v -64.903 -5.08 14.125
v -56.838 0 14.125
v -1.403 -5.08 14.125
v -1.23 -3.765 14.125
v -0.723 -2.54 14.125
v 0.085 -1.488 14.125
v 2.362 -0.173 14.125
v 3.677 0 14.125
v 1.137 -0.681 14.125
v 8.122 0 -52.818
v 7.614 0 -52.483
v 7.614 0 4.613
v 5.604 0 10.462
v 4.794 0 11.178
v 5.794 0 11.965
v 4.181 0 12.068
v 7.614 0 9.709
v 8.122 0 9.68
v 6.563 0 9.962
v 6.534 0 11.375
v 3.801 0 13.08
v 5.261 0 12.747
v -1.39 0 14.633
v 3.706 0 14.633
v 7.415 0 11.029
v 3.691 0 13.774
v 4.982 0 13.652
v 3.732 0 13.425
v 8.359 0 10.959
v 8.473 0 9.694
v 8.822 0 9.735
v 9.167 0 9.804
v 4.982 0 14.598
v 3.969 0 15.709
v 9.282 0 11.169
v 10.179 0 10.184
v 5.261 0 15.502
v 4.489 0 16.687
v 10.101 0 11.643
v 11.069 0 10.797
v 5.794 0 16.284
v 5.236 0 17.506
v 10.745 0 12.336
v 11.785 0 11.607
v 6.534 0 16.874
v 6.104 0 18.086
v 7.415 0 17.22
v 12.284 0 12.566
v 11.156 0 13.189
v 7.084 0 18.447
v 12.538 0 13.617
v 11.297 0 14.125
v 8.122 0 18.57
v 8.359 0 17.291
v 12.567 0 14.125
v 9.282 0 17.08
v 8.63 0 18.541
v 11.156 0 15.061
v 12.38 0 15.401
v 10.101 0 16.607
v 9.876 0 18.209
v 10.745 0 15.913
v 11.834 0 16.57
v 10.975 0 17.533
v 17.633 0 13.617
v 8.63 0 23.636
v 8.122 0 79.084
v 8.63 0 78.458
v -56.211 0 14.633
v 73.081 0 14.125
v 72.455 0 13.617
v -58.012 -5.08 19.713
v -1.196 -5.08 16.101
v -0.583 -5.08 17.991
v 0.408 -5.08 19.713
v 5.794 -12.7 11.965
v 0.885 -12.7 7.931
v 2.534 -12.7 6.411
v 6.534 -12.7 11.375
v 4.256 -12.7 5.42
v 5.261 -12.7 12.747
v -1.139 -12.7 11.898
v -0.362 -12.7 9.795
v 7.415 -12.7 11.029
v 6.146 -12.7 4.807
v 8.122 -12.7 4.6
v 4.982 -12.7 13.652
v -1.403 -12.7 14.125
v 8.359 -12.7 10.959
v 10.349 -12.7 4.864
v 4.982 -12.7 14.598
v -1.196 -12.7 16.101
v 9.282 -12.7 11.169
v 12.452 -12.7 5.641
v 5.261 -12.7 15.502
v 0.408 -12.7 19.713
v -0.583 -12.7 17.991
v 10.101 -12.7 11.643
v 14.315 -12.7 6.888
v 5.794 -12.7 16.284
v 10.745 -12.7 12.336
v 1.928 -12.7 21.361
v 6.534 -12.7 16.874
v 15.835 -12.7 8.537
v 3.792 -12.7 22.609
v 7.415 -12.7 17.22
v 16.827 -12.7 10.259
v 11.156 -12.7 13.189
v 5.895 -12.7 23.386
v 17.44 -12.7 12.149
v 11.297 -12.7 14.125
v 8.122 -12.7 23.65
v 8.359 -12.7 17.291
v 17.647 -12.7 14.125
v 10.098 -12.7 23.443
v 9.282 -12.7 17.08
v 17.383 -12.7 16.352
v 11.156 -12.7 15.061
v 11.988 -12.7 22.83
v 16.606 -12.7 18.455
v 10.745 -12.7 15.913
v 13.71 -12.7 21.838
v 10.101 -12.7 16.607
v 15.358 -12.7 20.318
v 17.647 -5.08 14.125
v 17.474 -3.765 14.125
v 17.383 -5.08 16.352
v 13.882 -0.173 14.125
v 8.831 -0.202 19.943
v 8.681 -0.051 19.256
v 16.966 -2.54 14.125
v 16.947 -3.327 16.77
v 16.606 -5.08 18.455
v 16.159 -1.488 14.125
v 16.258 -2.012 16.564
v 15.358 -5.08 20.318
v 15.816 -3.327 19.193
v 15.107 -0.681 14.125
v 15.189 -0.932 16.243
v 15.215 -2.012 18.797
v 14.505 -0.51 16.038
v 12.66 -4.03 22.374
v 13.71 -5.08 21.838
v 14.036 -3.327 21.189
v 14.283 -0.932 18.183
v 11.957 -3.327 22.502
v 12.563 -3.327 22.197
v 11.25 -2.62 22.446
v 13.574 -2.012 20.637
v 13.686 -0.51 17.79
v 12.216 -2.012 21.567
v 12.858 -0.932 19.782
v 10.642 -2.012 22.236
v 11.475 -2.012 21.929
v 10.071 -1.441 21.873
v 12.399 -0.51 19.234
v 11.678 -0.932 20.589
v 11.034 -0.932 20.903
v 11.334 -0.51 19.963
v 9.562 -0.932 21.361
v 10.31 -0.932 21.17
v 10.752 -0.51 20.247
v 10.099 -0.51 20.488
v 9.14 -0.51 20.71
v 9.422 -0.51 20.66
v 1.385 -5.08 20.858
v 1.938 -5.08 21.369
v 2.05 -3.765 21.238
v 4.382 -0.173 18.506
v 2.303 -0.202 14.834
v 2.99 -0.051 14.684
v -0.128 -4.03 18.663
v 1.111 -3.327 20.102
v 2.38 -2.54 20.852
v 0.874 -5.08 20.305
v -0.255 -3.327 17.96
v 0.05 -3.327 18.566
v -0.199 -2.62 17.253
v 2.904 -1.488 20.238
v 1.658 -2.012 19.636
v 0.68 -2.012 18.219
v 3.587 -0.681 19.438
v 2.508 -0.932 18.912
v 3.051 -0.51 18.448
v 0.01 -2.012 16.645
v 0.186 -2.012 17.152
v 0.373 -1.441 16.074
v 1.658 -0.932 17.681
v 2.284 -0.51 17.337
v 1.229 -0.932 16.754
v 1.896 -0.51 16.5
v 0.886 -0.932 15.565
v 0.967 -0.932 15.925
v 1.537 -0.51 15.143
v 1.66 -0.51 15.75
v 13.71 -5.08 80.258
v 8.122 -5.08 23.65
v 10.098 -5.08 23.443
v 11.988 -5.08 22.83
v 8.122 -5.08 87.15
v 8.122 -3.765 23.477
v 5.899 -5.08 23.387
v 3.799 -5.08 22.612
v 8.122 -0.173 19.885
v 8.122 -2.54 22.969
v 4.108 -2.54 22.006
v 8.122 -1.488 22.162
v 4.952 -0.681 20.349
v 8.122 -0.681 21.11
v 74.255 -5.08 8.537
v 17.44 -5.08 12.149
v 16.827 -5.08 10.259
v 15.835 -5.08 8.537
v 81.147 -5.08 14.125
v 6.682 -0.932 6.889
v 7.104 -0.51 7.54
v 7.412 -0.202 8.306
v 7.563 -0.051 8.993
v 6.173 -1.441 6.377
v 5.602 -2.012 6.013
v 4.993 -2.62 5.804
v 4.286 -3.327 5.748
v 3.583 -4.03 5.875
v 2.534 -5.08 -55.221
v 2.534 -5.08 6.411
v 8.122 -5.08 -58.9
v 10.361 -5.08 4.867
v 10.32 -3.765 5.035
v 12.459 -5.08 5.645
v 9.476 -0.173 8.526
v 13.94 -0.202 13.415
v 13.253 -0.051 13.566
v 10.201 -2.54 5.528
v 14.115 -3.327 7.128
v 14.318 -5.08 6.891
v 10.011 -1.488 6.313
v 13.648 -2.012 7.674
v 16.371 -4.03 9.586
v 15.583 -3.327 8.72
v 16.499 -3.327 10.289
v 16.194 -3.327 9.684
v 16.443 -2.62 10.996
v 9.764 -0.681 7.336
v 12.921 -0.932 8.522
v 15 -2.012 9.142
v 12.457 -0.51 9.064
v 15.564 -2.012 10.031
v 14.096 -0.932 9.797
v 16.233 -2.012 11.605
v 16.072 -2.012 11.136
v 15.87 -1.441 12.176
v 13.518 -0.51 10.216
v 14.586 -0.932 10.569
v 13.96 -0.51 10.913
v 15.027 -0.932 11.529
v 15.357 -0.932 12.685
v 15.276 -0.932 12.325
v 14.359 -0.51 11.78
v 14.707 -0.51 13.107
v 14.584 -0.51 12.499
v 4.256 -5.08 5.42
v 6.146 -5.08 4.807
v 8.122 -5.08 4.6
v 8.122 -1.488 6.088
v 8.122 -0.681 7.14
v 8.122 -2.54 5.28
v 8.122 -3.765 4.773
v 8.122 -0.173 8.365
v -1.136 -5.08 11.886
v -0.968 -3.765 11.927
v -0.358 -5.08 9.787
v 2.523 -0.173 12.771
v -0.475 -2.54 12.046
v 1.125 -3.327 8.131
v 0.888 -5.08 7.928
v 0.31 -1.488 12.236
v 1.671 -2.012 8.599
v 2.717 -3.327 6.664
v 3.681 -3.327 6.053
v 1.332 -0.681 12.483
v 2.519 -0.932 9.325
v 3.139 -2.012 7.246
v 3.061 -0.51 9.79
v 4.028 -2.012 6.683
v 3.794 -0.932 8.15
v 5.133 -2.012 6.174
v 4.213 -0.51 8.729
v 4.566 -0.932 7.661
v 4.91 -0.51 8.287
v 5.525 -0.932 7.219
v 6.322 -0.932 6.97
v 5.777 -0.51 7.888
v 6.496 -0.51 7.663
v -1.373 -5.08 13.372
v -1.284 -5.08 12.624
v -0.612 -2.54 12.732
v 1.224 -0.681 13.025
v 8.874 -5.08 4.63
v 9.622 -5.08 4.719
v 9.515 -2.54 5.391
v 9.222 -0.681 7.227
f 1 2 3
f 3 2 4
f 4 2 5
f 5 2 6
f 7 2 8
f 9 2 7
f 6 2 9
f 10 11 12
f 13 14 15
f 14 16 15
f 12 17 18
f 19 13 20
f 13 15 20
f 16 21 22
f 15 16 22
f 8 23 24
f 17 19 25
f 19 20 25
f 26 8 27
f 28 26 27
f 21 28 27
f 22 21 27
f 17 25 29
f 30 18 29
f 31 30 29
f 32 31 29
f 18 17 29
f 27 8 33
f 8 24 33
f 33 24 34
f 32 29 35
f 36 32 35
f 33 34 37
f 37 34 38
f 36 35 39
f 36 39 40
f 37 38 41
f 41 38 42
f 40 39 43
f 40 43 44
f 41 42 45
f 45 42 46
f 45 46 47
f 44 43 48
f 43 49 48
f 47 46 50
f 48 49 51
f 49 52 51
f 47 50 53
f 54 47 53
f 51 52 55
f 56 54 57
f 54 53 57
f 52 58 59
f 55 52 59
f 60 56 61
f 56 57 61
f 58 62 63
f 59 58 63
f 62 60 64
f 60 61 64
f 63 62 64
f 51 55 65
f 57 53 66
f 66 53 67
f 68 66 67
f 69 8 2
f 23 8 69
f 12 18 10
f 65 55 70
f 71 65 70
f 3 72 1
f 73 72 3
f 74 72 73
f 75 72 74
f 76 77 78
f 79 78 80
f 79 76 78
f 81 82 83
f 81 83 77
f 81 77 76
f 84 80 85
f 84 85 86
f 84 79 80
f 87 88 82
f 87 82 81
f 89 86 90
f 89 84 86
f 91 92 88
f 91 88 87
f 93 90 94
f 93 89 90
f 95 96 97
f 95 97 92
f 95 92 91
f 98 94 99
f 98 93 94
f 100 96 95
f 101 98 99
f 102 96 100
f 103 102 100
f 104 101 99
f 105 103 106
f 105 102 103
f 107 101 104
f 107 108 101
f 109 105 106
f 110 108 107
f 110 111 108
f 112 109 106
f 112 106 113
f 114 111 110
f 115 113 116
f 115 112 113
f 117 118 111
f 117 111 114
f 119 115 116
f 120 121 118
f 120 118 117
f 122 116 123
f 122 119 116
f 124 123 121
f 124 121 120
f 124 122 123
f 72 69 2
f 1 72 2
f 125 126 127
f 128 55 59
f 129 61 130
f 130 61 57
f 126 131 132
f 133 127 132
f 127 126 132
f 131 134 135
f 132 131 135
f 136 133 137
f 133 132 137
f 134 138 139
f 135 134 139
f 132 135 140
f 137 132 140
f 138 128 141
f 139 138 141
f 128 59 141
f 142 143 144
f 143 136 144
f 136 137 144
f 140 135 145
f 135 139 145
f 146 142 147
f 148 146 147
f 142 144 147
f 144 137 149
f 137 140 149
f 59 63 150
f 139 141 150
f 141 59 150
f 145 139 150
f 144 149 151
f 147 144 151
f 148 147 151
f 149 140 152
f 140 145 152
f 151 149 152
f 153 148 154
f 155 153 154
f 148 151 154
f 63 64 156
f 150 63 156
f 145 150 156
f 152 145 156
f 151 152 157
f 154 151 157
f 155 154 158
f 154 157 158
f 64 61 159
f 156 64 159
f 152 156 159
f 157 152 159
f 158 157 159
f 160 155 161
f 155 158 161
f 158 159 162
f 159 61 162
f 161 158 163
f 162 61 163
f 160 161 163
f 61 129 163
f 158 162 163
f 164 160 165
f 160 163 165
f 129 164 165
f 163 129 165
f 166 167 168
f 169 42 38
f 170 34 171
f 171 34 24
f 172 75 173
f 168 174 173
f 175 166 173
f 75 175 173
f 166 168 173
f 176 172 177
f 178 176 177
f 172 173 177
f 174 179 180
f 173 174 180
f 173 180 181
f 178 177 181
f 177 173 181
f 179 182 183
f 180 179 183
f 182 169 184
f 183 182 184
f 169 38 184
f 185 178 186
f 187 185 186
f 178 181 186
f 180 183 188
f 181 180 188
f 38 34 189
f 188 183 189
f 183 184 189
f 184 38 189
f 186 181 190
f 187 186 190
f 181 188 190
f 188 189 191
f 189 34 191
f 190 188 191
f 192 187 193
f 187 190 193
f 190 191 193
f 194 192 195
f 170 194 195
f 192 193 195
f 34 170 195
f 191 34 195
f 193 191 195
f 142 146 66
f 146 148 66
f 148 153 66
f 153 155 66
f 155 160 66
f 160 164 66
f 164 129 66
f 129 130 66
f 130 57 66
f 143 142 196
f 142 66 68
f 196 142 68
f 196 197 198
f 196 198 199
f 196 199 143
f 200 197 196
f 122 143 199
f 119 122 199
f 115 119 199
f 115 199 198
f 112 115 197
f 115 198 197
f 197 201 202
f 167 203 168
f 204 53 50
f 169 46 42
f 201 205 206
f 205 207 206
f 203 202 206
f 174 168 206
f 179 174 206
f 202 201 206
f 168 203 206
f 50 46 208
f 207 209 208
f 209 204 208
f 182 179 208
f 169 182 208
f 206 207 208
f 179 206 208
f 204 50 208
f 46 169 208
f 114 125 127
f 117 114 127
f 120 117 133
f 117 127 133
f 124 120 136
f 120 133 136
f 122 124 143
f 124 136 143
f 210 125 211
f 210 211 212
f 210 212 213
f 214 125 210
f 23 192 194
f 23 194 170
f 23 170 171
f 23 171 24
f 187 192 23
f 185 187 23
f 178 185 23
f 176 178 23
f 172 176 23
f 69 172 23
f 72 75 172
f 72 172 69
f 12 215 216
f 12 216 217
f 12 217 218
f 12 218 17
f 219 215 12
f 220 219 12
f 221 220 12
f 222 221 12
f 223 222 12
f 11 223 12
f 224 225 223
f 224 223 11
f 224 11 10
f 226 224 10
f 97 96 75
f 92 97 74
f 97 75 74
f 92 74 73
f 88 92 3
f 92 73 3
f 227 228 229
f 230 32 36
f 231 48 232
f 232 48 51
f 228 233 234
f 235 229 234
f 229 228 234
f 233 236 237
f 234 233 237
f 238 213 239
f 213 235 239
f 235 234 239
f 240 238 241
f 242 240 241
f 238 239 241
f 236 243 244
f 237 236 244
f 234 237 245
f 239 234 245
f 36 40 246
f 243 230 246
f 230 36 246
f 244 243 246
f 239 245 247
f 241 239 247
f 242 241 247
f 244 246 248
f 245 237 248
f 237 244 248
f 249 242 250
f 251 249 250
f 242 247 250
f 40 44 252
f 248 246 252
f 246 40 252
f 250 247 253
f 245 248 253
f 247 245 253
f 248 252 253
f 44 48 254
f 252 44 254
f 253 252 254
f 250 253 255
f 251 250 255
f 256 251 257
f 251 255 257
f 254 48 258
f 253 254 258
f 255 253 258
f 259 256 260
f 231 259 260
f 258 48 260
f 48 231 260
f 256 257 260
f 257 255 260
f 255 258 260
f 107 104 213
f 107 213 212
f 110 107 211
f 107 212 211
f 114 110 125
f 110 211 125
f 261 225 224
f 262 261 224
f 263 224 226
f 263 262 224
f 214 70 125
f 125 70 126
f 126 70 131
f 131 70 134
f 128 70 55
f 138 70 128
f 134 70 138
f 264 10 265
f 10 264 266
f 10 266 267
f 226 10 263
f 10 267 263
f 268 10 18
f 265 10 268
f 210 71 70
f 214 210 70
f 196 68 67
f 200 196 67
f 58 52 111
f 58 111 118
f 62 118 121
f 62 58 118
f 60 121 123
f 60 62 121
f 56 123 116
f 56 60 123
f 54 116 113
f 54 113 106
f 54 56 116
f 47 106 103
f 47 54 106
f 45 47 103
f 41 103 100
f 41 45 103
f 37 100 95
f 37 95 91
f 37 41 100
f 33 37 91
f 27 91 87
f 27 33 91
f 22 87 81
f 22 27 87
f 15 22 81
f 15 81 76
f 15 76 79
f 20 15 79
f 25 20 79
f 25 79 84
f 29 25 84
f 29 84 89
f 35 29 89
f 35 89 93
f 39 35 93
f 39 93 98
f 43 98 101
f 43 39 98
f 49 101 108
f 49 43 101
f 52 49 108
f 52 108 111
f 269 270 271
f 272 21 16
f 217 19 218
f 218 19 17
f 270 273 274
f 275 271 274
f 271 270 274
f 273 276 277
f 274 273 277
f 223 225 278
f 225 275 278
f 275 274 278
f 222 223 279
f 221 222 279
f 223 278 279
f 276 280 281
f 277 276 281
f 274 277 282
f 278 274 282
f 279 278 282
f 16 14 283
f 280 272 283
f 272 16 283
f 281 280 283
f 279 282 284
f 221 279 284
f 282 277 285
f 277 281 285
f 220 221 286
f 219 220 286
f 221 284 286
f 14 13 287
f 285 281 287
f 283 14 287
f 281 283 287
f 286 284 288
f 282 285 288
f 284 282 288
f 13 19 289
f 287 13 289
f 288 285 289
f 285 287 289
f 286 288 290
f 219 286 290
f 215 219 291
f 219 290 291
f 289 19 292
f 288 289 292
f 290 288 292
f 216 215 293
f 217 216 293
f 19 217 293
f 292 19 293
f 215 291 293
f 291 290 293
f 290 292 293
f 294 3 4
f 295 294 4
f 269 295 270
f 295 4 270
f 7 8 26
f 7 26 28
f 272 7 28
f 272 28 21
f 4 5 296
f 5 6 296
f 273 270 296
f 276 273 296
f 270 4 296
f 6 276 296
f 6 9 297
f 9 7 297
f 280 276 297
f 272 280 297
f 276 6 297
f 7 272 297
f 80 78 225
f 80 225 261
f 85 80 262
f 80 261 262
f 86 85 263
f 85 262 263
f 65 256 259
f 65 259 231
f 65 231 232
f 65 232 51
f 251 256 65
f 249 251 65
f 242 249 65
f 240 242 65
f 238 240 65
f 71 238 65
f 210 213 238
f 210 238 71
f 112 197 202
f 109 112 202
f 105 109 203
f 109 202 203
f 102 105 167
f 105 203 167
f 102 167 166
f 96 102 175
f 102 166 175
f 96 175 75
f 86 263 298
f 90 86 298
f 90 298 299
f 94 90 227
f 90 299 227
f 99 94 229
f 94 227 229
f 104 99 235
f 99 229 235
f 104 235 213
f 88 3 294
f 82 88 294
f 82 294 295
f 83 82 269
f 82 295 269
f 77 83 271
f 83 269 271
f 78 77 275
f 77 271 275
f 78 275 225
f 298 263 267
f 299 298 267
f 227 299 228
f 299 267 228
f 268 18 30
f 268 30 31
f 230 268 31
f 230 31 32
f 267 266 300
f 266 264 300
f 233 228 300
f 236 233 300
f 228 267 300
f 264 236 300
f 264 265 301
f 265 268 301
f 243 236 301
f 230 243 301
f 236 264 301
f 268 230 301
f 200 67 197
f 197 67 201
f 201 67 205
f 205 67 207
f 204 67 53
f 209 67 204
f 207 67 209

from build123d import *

# Parameters (mm, degrees)
F0_R         = 3.175
F1_DEPTH     = 12.7
F2_DEPTH     = 5.08
F3_SIZE      = 5.07999
F4_T3_ANGLE  = 206.8900819295
F4_T7_ANGLE  = 130.484631046
F4_T11_ANGLE = 206.8900819295
F4_T15_ANGLE = 206.8900819295
F4_T19_ANGLE = 130.484631046
F4_T23_ANGLE = 206.8900819295
F4_T27_ANGLE = 206.8900819295
F4_T31_ANGLE = 130.484631046
F4_T35_ANGLE = 206.8900819295
F4_T39_ANGLE = 206.8900819295
F4_T43_ANGLE = 130.484631046
F4_T47_ANGLE = 206.8900819295


# Not quite as in the source:
# - a fillet or chamfer that OpenCascade refuses, or shapes differently, is made with other operations: its cross-section is extruded or revolved along the edge and cut away or added
# - a fillet or chamfer is up to 0.001 mm smaller than in the source, because OpenCascade refuses the exact size


with BuildPart() as f1:
    # F0 (on Front) → F1 (new body)
    with BuildSketch(Plane.XZ):
        with BuildLine():
            ThreePointArc((15.8353851332, 8.5368495443), (17.1826135049, 11.1877228091), (17.6467685365, 14.1248495443))
            ThreePointArc((17.6467685365, 14.1248495443), (16.6056156886, 18.4549722331), (13.7097685365, 21.838466141))
            ThreePointArc((13.7097685365, 21.838466141), (11.0588952717, 23.1856945127), (8.1217685365, 23.6498495443))
            ThreePointArc((8.1217685365, 23.6498495443), (3.7916458477, 22.6086966964), (0.4081519399, 19.7128495443))
            ThreePointArc((0.4081519399, 19.7128495443), (-0.9390764319, 17.0619762795), (-1.4032314635, 14.1248495443))
            ThreePointArc((-1.4032314635, 14.1248495443), (-0.3620786156, 9.7947268555), (2.5337685365, 6.4112329477))
            ThreePointArc((2.5337685365, 6.4112329477), (5.1846418013, 5.0640045759), (8.1217685365, 4.5998495443))
            ThreePointArc((8.1217685365, 4.5998495443), (12.4518912253, 5.6410023922), (15.8353851332, 8.5368495443))
        make_face()
        with Locations((8.1217685365, 14.1248495443)):
            Circle(F0_R, mode=Mode.SUBTRACT)
    extrude(amount=F1_DEPTH)

    # F0 (on Front) → F2 (join)
    with BuildSketch(Plane.XZ):
        with BuildLine():
            ThreePointArc((8.1217685365, 23.6498495443), (11.0588952717, 23.1856945127), (13.7097685365, 21.838466141))
            Line((13.7097685365, 21.838466141), (13.7097685365, 80.258466141))
            Line((13.7097685365, 80.258466141), (8.1217685365, 87.1498495443))
            Line((8.1217685365, 87.1498495443), (8.1217685365, 23.6498495443))
        make_face()
        with BuildLine():
            Line((81.1467685365, 14.1248495443), (17.6467685365, 14.1248495443))
            ThreePointArc((17.6467685365, 14.1248495443), (17.1826135049, 11.1877228091), (15.8353851332, 8.5368495443))
            Line((15.8353851332, 8.5368495443), (74.2553851332, 8.5368495443))
            Line((74.2553851332, 8.5368495443), (81.1467685365, 14.1248495443))
        make_face()
        with BuildLine():
            ThreePointArc((-1.4032314635, 14.1248495443), (-0.9390764319, 17.0619762795), (0.4081519399, 19.7128495443))
            Line((0.4081519399, 19.7128495443), (-58.0118480601, 19.7128495443))
            Line((-58.0118480601, 19.7128495443), (-64.9032314635, 14.1248495443))
            Line((-64.9032314635, 14.1248495443), (-1.4032314635, 14.1248495443))
        make_face()
        with BuildLine():
            Line((8.1217685365, -58.9001504557), (8.1217685365, 4.5998495443))
            ThreePointArc((8.1217685365, 4.5998495443), (5.1846418013, 5.0640045759), (2.5337685365, 6.4112329477))
            Line((2.5337685365, 6.4112329477), (2.5337685365, -55.2206523716))
            Line((2.5337685365, -55.2206523716), (8.1217685365, -58.9001504557))
        make_face()
    extrude(amount=F2_DEPTH)

    # F3 (size 5.08 in the source; OpenCascade refuses exactly that, so slightly less here)
    f3_edges = [f1.edges().sort_by_distance(p)[0] for p in [
        (77.701077, 0, 11.33085),
        (45.045385, 0, 8.53685),
        (13.709769, 0, 51.048466),
        (10.915769, 0, 83.704158),
        (2.533769, 0, -24.40471),
        (5.327769, 0, -57.060401),
        (-28.801848, 0, 19.71285),
        (-61.45754, 0, 16.91885),
    ]]
    chamfer(f3_edges, length=F3_SIZE)

    # F4: fillet of radius 5.08 on 4 edges, made by hand


with BuildPart() as f4_tool1:
    # F4_s2 → F4_t3 (revolve)
    with BuildSketch(Plane(origin=(10.9000788328, 0, 2.6359089402), x_dir=(0, 1, 0), z_dir=(-0.9719833666, 0, -0.2350496437))):
        with BuildLine():
            ThreePointArc((-5.08, -2.2951000126), (-1.4878975516, -3.7829975641), (0, -7.3751000126))
            Line((0, -7.3751000126), (0, -2.2951000126))
            Line((0, -2.2951000126), (-5.08, -2.2951000126))
        make_face()
    revolve(axis=Axis((8.1217685365, 0, 14.1248495443), (0, -1, 0)), revolution_arc=F4_T3_ANGLE)

    split(bisect_by=Plane(origin=(0, -6.8084197722, 6.8084197722), x_dir=(1, 0, 0), z_dir=(0, 0.7071067812, -0.7071067812)), keep=Keep.TOP)


with BuildPart() as f4_tool5:
    # F4_s6 → F4_t7 (revolve)
    with BuildSketch(Plane.XY.offset(14.1248495443)):
        with BuildLine():
            ThreePointArc((17.6467685365, -5.08), (16.158870985, -1.4878975516), (12.5667685365, 0))
            Line((12.5667685365, 0), (17.6467685365, 0))
            Line((17.6467685365, 0), (17.6467685365, -5.08))
        make_face()
    revolve(axis=Axis((8.1217685365, 0, 14.1248495443), (0, -1, 0)), revolution_arc=F4_T7_ANGLE)

    split(bisect_by=Plane(origin=(4.3148892683, 4.3148892683, 0), x_dir=(0, 0, 1), z_dir=(0.7071067812, 0.7071067812, 0)), keep=Keep.TOP)


with BuildPart() as f4_tool9:
    # F4_s10 → F4_t11 (revolve)
    with BuildSketch(Plane(origin=(10.9000788328, 0, 2.6359089402), x_dir=(0, 1, 0), z_dir=(-0.9719833666, 0, -0.2350496437))):
        with BuildLine():
            ThreePointArc((-5.08, -2.2951000126), (-1.4878975516, -3.7829975641), (0, -7.3751000126))
            Line((0, -7.3751000126), (0, -2.2951000126))
            Line((0, -2.2951000126), (-5.08, -2.2951000126))
        make_face()
    revolve(axis=Axis((8.1217685365, 0, 14.1248495443), (0, -1, 0)), revolution_arc=F4_T11_ANGLE)

    split(bisect_by=Plane.YZ.offset(8.1217685365), keep=Keep.BOTTOM)


with BuildPart() as f4_tool13:
    # F4_s14 → F4_t15 (revolve)
    with BuildSketch(Plane(origin=(-2.7783102963, 0, 11.4889406041), x_dir=(0, 1, 0), z_dir=(-0.2350496437, 0, 0.9719833666))):
        with BuildLine():
            ThreePointArc((-5.08, -1.6892647777), (-1.4878975516, -3.1771623292), (0, -6.7692647777))
            Line((0, -6.7692647777), (0, -1.6892647777))
            Line((0, -1.6892647777), (-5.08, -1.6892647777))
        make_face()
    revolve(axis=Axis((8.1217685365, 0, 14.1248495443), (0, -1, 0)), revolution_arc=F4_T15_ANGLE)

    split(bisect_by=Plane(origin=(3.8068792683, -3.8068792683, 0), x_dir=(0, 0, 1), z_dir=(-0.7071067812, 0.7071067812, 0)), keep=Keep.TOP)


with BuildPart() as f4_tool17:
    # F4_s18 → F4_t19 (revolve)
    with BuildSketch(Plane.YZ.offset(8.1217685365)):
        with BuildLine():
            ThreePointArc((-5.08, 4.5998495443), (-1.4878975516, 6.0877470959), (0, 9.6798495443))
            Line((0, 9.6798495443), (0, 4.5998495443))
            Line((0, 4.5998495443), (-5.08, 4.5998495443))
        make_face()
    revolve(axis=Axis((8.1217685365, 0, 14.1248495443), (0, -1, 0)), revolution_arc=F4_T19_ANGLE)

    split(bisect_by=Plane(origin=(0, -6.8084197722, 6.8084197722), x_dir=(1, 0, 0), z_dir=(0, 0.7071067812, -0.7071067812)), keep=Keep.TOP)


with BuildPart() as f4_tool21:
    # F4_s22 → F4_t23 (revolve)
    with BuildSketch(Plane(origin=(-2.7783102963, 0, 11.4889406041), x_dir=(0, 1, 0), z_dir=(-0.2350496437, 0, 0.9719833666))):
        with BuildLine():
            ThreePointArc((-5.08, -1.6892647777), (-1.4878975516, -3.1771623292), (0, -6.7692647777))
            Line((0, -6.7692647777), (0, -1.6892647777))
            Line((0, -1.6892647777), (-5.08, -1.6892647777))
        make_face()
    revolve(axis=Axis((8.1217685365, 0, 14.1248495443), (0, -1, 0)), revolution_arc=F4_T23_ANGLE)

    split(bisect_by=Plane.XY.offset(14.1248495443), keep=Keep.TOP)


with BuildPart() as f4_tool25:
    # F4_s26 → F4_t27 (revolve)
    with BuildSketch(Plane(origin=(-2.7783102963, 0, 11.4889406041), x_dir=(0, 1, 0), z_dir=(0.2350496437, 0, -0.9719833666))):
        with BuildLine():
            ThreePointArc((-5.08, 20.7392647777), (-1.4878975516, 19.2513672261), (0, 15.6592647777))
            Line((0, 15.6592647777), (0, 20.7392647777))
            Line((0, 20.7392647777), (-5.08, 20.7392647777))
        make_face()
    revolve(axis=Axis((8.1217685365, 0, 14.1248495443), (0, -1, 0)), revolution_arc=F4_T27_ANGLE)

    split(bisect_by=Plane(origin=(4.3148892683, 4.3148892683, 0), x_dir=(0, 0, 1), z_dir=(0.7071067812, 0.7071067812, 0)), keep=Keep.TOP)


with BuildPart() as f4_tool29:
    # F4_s30 → F4_t31 (revolve)
    with BuildSketch(Plane.YZ.offset(8.1217685365)):
        with BuildLine():
            ThreePointArc((-5.08, 23.6498495443), (-1.4878975516, 22.1619519927), (0, 18.5698495443))
            Line((0, 18.5698495443), (0, 23.6498495443))
            Line((0, 23.6498495443), (-5.08, 23.6498495443))
        make_face()
    revolve(axis=Axis((8.1217685365, 0, 14.1248495443), (0, -1, 0)), revolution_arc=F4_T31_ANGLE)

    split(bisect_by=Plane(origin=(0, 7.3164297722, 7.3164297722), x_dir=(1, 0, 0), z_dir=(0, 0.7071067812, 0.7071067812)), keep=Keep.TOP)


with BuildPart() as f4_tool33:
    # F4_s34 → F4_t35 (revolve)
    with BuildSketch(Plane(origin=(-2.7783102963, 0, 11.4889406041), x_dir=(0, 1, 0), z_dir=(0.2350496437, 0, -0.9719833666))):
        with BuildLine():
            ThreePointArc((-5.08, 20.7392647777), (-1.4878975516, 19.2513672261), (0, 15.6592647777))
            Line((0, 15.6592647777), (0, 20.7392647777))
            Line((0, 20.7392647777), (-5.08, 20.7392647777))
        make_face()
    revolve(axis=Axis((8.1217685365, 0, 14.1248495443), (0, -1, 0)), revolution_arc=F4_T35_ANGLE)

    split(bisect_by=Plane.XY.offset(14.1248495443), keep=Keep.BOTTOM)


with BuildPart() as f4_tool37:
    # F4_s38 → F4_t39 (revolve)
    with BuildSketch(Plane(origin=(10.9000788328, 0, 2.6359089402), x_dir=(0, 1, 0), z_dir=(0.9719833666, 0, 0.2350496437))):
        with BuildLine():
            ThreePointArc((-5.08, 21.3451000126), (-1.4878975516, 19.857202461), (0, 16.2651000126))
            Line((0, 16.2651000126), (0, 21.3451000126))
            Line((0, 21.3451000126), (-5.08, 21.3451000126))
        make_face()
    revolve(axis=Axis((8.1217685365, 0, 14.1248495443), (0, -1, 0)), revolution_arc=F4_T39_ANGLE)

    split(bisect_by=Plane(origin=(0, 7.3164297722, 7.3164297722), x_dir=(1, 0, 0), z_dir=(0, 0.7071067812, 0.7071067812)), keep=Keep.TOP)


with BuildPart() as f4_tool41:
    # F4_s42 → F4_t43 (revolve)
    with BuildSketch(Plane.XY.offset(14.1248495443)):
        with BuildLine():
            ThreePointArc((-1.4032314635, -5.08), (0.0846660881, -1.4878975516), (3.6767685365, 0))
            Line((3.6767685365, 0), (-1.4032314635, 0))
            Line((-1.4032314635, 0), (-1.4032314635, -5.08))
        make_face()
    revolve(axis=Axis((8.1217685365, 0, 14.1248495443), (0, -1, 0)), revolution_arc=F4_T43_ANGLE)

    split(bisect_by=Plane(origin=(3.8068792683, -3.8068792683, 0), x_dir=(0, 0, 1), z_dir=(-0.7071067812, 0.7071067812, 0)), keep=Keep.TOP)


with BuildPart() as f4_tool45:
    # F4_s46 → F4_t47 (revolve)
    with BuildSketch(Plane(origin=(10.9000788328, 0, 2.6359089402), x_dir=(0, 1, 0), z_dir=(0.9719833666, 0, 0.2350496437))):
        with BuildLine():
            ThreePointArc((-5.08, 21.3451000126), (-1.4878975516, 19.857202461), (0, 16.2651000126))
            Line((0, 16.2651000126), (0, 21.3451000126))
            Line((0, 21.3451000126), (-5.08, 21.3451000126))
        make_face()
    revolve(axis=Axis((8.1217685365, 0, 14.1248495443), (0, -1, 0)), revolution_arc=F4_T47_ANGLE)

    split(bisect_by=Plane.YZ.offset(8.1217685365), keep=Keep.TOP)


with BuildPart() as f1_1:
    add(f1.part)

    # F4_t49: cut F4_tool1, F4_tool5, F4_tool9, F4_tool13, F4_tool17, F4_tool21, F4_tool25, F4_tool29, F4_tool33, F4_tool37, F4_tool41, F4_tool45
    add([f4_tool1.part, f4_tool5.part, f4_tool9.part, f4_tool13.part, f4_tool17.part, f4_tool21.part, f4_tool25.part, f4_tool29.part, f4_tool33.part, f4_tool37.part, f4_tool41.part, f4_tool45.part], mode=Mode.SUBTRACT)


solid = f1_1.part
